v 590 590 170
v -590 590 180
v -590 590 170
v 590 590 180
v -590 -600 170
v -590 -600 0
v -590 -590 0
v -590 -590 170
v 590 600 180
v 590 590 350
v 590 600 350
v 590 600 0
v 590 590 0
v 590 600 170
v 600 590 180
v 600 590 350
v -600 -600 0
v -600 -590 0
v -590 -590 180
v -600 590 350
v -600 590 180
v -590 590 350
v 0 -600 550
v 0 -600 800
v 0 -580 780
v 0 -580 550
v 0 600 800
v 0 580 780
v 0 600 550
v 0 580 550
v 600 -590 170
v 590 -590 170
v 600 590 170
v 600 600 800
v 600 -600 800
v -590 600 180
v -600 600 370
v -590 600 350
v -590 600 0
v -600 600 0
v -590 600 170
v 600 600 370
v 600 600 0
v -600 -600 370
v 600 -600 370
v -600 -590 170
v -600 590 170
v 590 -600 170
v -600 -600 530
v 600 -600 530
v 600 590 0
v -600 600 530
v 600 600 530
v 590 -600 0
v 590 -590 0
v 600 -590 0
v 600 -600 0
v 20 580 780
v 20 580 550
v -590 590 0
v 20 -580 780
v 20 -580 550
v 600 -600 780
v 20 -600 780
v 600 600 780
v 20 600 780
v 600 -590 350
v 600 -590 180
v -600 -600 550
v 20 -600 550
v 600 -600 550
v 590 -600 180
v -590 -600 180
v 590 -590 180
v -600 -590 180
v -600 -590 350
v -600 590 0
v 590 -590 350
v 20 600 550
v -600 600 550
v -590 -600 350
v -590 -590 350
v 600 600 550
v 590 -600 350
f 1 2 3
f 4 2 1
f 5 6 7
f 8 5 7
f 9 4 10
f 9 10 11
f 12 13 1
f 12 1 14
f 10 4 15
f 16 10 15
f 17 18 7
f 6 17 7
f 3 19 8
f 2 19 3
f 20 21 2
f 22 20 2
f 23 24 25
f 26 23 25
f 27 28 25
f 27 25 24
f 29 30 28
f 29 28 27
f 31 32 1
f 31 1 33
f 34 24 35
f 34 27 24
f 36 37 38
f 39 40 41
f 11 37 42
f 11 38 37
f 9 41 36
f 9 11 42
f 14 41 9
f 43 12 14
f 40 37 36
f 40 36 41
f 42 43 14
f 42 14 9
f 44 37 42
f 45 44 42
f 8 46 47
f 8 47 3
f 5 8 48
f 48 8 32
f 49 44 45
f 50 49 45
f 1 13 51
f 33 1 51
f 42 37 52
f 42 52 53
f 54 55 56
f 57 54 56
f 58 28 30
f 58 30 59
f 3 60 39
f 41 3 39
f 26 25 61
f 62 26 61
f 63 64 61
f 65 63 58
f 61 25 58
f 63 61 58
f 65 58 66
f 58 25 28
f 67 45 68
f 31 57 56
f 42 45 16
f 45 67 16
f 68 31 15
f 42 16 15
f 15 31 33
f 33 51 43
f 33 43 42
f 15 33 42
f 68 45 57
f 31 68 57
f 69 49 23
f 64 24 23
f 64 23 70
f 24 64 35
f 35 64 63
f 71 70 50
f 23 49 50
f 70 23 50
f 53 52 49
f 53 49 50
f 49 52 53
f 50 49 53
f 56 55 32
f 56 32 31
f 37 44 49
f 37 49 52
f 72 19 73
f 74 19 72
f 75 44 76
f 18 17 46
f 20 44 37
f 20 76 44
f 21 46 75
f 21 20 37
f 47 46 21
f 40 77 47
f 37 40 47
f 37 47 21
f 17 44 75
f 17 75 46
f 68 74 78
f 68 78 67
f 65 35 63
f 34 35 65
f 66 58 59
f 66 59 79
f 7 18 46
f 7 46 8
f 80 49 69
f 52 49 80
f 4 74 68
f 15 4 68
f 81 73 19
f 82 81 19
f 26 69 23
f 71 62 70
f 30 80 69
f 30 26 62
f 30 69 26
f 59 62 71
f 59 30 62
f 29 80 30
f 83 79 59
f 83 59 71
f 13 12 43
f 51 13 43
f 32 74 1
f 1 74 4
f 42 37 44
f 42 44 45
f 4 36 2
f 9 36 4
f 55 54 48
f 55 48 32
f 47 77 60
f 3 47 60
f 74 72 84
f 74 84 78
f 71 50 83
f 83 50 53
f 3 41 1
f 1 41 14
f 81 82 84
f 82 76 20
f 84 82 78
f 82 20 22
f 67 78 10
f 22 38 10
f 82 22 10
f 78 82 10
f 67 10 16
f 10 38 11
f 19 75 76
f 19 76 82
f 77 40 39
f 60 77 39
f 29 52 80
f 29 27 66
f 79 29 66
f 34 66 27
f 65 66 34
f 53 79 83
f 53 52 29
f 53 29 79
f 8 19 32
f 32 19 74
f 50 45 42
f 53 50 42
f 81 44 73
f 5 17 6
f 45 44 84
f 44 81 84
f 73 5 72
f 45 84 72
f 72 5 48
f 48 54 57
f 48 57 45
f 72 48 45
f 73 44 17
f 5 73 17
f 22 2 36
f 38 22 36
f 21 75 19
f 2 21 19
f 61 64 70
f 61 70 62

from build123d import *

# Parameters (mm, degrees)
F0_W      = 10
F0_H      = 10
F1_DEPTH  = 350
F3_W      = 1200
F3_H      = 1200
F3_W_2    = 1180
F3_H_2    = 1180
F4_DEPTH  = 5
F6_W      = 1200
F6_H      = 1200
F7_DEPTH  = 20
F8_DEPTH  = 160
F9_DEPTH  = 20
F10_W     = 20
F10_H     = 20
F11_DEPTH = 250
F13_W     = 1200
F13_H     = 20
F14_DEPTH = 600


with BuildPart() as f1:
    # F0 (on Top) → F1 (new body)
    with BuildSketch(Plane.XY):
        with Locations((-595, 595)):
            Rectangle(F0_W, F0_H)
    extrude(amount=F1_DEPTH)



with BuildPart() as f1b:
    # F0 (on Top) → F1, piece 2 (new body)
    with BuildSketch(Plane.XY):
        with Locations((595, 595)):
            Rectangle(F0_W, F0_H)
    extrude(amount=F1_DEPTH)


with BuildPart() as f1c:
    # F0 (on Top) → F1, piece 3 (new body)
    with BuildSketch(Plane.XY):
        with Locations((595, -595)):
            Rectangle(F0_W, F0_H)
    extrude(amount=F1_DEPTH)


with BuildPart() as f1d:
    # F0 (on Top) → F1, piece 4 (new body)
    with BuildSketch(Plane.XY):
        with Locations((-595, -595)):
            Rectangle(F0_W, F0_H)
    extrude(amount=F1_DEPTH)


with BuildPart() as f1_1:
    add(f1.part)

    add(f1b.part)  # F4 merges F1b

    add(f1c.part)  # F4 merges F1c

    add(f1d.part)  # F4 merges F1d
    # F3 (on offset) → F4 (join, symmetric)
    with BuildSketch(Plane.XY.offset(175)):
        Rectangle(F3_W, F3_H)
        Rectangle(F3_W_2, F3_H_2, mode=Mode.SUBTRACT)
    extrude(amount=F4_DEPTH, both=True)

    # F6 (on offset) → F7 (join)
    with BuildSketch(Plane.XY.offset(350)):
        Rectangle(F6_W, F6_H)
    extrude(amount=F7_DEPTH)


with BuildPart() as f8:
    # F8 (new): a face of the model
    f8_faces = [f1_1.part.faces().sort_by_distance(p)[0] for p in [
        (0, 0, 370),
    ]]
    extrude(f8_faces, amount=F8_DEPTH)


with BuildPart() as f9:
    # F9 (new): a face of the model
    f9_faces = [f8.part.faces().sort_by_distance(p)[0] for p in [
        (0, 0, 530),
    ]]
    extrude(f9_faces, amount=F9_DEPTH)

    # F10 (on face) → F11 (join)
    with BuildSketch(Plane.XY.offset(550)):
        with Locations((10, 590)):
            Rectangle(F10_W, F10_H)
        with Locations((10, -590)):
            Rectangle(F10_W, F10_H)
    extrude(amount=F11_DEPTH)

    # F13 (on offset) → F14 (join)
    with BuildSketch(Plane.YZ):
        with Locations((0, 790)):
            Rectangle(F13_W, F13_H)
    extrude(amount=F14_DEPTH)


solid = Compound([f1_1.part, f8.part, f9.part])
